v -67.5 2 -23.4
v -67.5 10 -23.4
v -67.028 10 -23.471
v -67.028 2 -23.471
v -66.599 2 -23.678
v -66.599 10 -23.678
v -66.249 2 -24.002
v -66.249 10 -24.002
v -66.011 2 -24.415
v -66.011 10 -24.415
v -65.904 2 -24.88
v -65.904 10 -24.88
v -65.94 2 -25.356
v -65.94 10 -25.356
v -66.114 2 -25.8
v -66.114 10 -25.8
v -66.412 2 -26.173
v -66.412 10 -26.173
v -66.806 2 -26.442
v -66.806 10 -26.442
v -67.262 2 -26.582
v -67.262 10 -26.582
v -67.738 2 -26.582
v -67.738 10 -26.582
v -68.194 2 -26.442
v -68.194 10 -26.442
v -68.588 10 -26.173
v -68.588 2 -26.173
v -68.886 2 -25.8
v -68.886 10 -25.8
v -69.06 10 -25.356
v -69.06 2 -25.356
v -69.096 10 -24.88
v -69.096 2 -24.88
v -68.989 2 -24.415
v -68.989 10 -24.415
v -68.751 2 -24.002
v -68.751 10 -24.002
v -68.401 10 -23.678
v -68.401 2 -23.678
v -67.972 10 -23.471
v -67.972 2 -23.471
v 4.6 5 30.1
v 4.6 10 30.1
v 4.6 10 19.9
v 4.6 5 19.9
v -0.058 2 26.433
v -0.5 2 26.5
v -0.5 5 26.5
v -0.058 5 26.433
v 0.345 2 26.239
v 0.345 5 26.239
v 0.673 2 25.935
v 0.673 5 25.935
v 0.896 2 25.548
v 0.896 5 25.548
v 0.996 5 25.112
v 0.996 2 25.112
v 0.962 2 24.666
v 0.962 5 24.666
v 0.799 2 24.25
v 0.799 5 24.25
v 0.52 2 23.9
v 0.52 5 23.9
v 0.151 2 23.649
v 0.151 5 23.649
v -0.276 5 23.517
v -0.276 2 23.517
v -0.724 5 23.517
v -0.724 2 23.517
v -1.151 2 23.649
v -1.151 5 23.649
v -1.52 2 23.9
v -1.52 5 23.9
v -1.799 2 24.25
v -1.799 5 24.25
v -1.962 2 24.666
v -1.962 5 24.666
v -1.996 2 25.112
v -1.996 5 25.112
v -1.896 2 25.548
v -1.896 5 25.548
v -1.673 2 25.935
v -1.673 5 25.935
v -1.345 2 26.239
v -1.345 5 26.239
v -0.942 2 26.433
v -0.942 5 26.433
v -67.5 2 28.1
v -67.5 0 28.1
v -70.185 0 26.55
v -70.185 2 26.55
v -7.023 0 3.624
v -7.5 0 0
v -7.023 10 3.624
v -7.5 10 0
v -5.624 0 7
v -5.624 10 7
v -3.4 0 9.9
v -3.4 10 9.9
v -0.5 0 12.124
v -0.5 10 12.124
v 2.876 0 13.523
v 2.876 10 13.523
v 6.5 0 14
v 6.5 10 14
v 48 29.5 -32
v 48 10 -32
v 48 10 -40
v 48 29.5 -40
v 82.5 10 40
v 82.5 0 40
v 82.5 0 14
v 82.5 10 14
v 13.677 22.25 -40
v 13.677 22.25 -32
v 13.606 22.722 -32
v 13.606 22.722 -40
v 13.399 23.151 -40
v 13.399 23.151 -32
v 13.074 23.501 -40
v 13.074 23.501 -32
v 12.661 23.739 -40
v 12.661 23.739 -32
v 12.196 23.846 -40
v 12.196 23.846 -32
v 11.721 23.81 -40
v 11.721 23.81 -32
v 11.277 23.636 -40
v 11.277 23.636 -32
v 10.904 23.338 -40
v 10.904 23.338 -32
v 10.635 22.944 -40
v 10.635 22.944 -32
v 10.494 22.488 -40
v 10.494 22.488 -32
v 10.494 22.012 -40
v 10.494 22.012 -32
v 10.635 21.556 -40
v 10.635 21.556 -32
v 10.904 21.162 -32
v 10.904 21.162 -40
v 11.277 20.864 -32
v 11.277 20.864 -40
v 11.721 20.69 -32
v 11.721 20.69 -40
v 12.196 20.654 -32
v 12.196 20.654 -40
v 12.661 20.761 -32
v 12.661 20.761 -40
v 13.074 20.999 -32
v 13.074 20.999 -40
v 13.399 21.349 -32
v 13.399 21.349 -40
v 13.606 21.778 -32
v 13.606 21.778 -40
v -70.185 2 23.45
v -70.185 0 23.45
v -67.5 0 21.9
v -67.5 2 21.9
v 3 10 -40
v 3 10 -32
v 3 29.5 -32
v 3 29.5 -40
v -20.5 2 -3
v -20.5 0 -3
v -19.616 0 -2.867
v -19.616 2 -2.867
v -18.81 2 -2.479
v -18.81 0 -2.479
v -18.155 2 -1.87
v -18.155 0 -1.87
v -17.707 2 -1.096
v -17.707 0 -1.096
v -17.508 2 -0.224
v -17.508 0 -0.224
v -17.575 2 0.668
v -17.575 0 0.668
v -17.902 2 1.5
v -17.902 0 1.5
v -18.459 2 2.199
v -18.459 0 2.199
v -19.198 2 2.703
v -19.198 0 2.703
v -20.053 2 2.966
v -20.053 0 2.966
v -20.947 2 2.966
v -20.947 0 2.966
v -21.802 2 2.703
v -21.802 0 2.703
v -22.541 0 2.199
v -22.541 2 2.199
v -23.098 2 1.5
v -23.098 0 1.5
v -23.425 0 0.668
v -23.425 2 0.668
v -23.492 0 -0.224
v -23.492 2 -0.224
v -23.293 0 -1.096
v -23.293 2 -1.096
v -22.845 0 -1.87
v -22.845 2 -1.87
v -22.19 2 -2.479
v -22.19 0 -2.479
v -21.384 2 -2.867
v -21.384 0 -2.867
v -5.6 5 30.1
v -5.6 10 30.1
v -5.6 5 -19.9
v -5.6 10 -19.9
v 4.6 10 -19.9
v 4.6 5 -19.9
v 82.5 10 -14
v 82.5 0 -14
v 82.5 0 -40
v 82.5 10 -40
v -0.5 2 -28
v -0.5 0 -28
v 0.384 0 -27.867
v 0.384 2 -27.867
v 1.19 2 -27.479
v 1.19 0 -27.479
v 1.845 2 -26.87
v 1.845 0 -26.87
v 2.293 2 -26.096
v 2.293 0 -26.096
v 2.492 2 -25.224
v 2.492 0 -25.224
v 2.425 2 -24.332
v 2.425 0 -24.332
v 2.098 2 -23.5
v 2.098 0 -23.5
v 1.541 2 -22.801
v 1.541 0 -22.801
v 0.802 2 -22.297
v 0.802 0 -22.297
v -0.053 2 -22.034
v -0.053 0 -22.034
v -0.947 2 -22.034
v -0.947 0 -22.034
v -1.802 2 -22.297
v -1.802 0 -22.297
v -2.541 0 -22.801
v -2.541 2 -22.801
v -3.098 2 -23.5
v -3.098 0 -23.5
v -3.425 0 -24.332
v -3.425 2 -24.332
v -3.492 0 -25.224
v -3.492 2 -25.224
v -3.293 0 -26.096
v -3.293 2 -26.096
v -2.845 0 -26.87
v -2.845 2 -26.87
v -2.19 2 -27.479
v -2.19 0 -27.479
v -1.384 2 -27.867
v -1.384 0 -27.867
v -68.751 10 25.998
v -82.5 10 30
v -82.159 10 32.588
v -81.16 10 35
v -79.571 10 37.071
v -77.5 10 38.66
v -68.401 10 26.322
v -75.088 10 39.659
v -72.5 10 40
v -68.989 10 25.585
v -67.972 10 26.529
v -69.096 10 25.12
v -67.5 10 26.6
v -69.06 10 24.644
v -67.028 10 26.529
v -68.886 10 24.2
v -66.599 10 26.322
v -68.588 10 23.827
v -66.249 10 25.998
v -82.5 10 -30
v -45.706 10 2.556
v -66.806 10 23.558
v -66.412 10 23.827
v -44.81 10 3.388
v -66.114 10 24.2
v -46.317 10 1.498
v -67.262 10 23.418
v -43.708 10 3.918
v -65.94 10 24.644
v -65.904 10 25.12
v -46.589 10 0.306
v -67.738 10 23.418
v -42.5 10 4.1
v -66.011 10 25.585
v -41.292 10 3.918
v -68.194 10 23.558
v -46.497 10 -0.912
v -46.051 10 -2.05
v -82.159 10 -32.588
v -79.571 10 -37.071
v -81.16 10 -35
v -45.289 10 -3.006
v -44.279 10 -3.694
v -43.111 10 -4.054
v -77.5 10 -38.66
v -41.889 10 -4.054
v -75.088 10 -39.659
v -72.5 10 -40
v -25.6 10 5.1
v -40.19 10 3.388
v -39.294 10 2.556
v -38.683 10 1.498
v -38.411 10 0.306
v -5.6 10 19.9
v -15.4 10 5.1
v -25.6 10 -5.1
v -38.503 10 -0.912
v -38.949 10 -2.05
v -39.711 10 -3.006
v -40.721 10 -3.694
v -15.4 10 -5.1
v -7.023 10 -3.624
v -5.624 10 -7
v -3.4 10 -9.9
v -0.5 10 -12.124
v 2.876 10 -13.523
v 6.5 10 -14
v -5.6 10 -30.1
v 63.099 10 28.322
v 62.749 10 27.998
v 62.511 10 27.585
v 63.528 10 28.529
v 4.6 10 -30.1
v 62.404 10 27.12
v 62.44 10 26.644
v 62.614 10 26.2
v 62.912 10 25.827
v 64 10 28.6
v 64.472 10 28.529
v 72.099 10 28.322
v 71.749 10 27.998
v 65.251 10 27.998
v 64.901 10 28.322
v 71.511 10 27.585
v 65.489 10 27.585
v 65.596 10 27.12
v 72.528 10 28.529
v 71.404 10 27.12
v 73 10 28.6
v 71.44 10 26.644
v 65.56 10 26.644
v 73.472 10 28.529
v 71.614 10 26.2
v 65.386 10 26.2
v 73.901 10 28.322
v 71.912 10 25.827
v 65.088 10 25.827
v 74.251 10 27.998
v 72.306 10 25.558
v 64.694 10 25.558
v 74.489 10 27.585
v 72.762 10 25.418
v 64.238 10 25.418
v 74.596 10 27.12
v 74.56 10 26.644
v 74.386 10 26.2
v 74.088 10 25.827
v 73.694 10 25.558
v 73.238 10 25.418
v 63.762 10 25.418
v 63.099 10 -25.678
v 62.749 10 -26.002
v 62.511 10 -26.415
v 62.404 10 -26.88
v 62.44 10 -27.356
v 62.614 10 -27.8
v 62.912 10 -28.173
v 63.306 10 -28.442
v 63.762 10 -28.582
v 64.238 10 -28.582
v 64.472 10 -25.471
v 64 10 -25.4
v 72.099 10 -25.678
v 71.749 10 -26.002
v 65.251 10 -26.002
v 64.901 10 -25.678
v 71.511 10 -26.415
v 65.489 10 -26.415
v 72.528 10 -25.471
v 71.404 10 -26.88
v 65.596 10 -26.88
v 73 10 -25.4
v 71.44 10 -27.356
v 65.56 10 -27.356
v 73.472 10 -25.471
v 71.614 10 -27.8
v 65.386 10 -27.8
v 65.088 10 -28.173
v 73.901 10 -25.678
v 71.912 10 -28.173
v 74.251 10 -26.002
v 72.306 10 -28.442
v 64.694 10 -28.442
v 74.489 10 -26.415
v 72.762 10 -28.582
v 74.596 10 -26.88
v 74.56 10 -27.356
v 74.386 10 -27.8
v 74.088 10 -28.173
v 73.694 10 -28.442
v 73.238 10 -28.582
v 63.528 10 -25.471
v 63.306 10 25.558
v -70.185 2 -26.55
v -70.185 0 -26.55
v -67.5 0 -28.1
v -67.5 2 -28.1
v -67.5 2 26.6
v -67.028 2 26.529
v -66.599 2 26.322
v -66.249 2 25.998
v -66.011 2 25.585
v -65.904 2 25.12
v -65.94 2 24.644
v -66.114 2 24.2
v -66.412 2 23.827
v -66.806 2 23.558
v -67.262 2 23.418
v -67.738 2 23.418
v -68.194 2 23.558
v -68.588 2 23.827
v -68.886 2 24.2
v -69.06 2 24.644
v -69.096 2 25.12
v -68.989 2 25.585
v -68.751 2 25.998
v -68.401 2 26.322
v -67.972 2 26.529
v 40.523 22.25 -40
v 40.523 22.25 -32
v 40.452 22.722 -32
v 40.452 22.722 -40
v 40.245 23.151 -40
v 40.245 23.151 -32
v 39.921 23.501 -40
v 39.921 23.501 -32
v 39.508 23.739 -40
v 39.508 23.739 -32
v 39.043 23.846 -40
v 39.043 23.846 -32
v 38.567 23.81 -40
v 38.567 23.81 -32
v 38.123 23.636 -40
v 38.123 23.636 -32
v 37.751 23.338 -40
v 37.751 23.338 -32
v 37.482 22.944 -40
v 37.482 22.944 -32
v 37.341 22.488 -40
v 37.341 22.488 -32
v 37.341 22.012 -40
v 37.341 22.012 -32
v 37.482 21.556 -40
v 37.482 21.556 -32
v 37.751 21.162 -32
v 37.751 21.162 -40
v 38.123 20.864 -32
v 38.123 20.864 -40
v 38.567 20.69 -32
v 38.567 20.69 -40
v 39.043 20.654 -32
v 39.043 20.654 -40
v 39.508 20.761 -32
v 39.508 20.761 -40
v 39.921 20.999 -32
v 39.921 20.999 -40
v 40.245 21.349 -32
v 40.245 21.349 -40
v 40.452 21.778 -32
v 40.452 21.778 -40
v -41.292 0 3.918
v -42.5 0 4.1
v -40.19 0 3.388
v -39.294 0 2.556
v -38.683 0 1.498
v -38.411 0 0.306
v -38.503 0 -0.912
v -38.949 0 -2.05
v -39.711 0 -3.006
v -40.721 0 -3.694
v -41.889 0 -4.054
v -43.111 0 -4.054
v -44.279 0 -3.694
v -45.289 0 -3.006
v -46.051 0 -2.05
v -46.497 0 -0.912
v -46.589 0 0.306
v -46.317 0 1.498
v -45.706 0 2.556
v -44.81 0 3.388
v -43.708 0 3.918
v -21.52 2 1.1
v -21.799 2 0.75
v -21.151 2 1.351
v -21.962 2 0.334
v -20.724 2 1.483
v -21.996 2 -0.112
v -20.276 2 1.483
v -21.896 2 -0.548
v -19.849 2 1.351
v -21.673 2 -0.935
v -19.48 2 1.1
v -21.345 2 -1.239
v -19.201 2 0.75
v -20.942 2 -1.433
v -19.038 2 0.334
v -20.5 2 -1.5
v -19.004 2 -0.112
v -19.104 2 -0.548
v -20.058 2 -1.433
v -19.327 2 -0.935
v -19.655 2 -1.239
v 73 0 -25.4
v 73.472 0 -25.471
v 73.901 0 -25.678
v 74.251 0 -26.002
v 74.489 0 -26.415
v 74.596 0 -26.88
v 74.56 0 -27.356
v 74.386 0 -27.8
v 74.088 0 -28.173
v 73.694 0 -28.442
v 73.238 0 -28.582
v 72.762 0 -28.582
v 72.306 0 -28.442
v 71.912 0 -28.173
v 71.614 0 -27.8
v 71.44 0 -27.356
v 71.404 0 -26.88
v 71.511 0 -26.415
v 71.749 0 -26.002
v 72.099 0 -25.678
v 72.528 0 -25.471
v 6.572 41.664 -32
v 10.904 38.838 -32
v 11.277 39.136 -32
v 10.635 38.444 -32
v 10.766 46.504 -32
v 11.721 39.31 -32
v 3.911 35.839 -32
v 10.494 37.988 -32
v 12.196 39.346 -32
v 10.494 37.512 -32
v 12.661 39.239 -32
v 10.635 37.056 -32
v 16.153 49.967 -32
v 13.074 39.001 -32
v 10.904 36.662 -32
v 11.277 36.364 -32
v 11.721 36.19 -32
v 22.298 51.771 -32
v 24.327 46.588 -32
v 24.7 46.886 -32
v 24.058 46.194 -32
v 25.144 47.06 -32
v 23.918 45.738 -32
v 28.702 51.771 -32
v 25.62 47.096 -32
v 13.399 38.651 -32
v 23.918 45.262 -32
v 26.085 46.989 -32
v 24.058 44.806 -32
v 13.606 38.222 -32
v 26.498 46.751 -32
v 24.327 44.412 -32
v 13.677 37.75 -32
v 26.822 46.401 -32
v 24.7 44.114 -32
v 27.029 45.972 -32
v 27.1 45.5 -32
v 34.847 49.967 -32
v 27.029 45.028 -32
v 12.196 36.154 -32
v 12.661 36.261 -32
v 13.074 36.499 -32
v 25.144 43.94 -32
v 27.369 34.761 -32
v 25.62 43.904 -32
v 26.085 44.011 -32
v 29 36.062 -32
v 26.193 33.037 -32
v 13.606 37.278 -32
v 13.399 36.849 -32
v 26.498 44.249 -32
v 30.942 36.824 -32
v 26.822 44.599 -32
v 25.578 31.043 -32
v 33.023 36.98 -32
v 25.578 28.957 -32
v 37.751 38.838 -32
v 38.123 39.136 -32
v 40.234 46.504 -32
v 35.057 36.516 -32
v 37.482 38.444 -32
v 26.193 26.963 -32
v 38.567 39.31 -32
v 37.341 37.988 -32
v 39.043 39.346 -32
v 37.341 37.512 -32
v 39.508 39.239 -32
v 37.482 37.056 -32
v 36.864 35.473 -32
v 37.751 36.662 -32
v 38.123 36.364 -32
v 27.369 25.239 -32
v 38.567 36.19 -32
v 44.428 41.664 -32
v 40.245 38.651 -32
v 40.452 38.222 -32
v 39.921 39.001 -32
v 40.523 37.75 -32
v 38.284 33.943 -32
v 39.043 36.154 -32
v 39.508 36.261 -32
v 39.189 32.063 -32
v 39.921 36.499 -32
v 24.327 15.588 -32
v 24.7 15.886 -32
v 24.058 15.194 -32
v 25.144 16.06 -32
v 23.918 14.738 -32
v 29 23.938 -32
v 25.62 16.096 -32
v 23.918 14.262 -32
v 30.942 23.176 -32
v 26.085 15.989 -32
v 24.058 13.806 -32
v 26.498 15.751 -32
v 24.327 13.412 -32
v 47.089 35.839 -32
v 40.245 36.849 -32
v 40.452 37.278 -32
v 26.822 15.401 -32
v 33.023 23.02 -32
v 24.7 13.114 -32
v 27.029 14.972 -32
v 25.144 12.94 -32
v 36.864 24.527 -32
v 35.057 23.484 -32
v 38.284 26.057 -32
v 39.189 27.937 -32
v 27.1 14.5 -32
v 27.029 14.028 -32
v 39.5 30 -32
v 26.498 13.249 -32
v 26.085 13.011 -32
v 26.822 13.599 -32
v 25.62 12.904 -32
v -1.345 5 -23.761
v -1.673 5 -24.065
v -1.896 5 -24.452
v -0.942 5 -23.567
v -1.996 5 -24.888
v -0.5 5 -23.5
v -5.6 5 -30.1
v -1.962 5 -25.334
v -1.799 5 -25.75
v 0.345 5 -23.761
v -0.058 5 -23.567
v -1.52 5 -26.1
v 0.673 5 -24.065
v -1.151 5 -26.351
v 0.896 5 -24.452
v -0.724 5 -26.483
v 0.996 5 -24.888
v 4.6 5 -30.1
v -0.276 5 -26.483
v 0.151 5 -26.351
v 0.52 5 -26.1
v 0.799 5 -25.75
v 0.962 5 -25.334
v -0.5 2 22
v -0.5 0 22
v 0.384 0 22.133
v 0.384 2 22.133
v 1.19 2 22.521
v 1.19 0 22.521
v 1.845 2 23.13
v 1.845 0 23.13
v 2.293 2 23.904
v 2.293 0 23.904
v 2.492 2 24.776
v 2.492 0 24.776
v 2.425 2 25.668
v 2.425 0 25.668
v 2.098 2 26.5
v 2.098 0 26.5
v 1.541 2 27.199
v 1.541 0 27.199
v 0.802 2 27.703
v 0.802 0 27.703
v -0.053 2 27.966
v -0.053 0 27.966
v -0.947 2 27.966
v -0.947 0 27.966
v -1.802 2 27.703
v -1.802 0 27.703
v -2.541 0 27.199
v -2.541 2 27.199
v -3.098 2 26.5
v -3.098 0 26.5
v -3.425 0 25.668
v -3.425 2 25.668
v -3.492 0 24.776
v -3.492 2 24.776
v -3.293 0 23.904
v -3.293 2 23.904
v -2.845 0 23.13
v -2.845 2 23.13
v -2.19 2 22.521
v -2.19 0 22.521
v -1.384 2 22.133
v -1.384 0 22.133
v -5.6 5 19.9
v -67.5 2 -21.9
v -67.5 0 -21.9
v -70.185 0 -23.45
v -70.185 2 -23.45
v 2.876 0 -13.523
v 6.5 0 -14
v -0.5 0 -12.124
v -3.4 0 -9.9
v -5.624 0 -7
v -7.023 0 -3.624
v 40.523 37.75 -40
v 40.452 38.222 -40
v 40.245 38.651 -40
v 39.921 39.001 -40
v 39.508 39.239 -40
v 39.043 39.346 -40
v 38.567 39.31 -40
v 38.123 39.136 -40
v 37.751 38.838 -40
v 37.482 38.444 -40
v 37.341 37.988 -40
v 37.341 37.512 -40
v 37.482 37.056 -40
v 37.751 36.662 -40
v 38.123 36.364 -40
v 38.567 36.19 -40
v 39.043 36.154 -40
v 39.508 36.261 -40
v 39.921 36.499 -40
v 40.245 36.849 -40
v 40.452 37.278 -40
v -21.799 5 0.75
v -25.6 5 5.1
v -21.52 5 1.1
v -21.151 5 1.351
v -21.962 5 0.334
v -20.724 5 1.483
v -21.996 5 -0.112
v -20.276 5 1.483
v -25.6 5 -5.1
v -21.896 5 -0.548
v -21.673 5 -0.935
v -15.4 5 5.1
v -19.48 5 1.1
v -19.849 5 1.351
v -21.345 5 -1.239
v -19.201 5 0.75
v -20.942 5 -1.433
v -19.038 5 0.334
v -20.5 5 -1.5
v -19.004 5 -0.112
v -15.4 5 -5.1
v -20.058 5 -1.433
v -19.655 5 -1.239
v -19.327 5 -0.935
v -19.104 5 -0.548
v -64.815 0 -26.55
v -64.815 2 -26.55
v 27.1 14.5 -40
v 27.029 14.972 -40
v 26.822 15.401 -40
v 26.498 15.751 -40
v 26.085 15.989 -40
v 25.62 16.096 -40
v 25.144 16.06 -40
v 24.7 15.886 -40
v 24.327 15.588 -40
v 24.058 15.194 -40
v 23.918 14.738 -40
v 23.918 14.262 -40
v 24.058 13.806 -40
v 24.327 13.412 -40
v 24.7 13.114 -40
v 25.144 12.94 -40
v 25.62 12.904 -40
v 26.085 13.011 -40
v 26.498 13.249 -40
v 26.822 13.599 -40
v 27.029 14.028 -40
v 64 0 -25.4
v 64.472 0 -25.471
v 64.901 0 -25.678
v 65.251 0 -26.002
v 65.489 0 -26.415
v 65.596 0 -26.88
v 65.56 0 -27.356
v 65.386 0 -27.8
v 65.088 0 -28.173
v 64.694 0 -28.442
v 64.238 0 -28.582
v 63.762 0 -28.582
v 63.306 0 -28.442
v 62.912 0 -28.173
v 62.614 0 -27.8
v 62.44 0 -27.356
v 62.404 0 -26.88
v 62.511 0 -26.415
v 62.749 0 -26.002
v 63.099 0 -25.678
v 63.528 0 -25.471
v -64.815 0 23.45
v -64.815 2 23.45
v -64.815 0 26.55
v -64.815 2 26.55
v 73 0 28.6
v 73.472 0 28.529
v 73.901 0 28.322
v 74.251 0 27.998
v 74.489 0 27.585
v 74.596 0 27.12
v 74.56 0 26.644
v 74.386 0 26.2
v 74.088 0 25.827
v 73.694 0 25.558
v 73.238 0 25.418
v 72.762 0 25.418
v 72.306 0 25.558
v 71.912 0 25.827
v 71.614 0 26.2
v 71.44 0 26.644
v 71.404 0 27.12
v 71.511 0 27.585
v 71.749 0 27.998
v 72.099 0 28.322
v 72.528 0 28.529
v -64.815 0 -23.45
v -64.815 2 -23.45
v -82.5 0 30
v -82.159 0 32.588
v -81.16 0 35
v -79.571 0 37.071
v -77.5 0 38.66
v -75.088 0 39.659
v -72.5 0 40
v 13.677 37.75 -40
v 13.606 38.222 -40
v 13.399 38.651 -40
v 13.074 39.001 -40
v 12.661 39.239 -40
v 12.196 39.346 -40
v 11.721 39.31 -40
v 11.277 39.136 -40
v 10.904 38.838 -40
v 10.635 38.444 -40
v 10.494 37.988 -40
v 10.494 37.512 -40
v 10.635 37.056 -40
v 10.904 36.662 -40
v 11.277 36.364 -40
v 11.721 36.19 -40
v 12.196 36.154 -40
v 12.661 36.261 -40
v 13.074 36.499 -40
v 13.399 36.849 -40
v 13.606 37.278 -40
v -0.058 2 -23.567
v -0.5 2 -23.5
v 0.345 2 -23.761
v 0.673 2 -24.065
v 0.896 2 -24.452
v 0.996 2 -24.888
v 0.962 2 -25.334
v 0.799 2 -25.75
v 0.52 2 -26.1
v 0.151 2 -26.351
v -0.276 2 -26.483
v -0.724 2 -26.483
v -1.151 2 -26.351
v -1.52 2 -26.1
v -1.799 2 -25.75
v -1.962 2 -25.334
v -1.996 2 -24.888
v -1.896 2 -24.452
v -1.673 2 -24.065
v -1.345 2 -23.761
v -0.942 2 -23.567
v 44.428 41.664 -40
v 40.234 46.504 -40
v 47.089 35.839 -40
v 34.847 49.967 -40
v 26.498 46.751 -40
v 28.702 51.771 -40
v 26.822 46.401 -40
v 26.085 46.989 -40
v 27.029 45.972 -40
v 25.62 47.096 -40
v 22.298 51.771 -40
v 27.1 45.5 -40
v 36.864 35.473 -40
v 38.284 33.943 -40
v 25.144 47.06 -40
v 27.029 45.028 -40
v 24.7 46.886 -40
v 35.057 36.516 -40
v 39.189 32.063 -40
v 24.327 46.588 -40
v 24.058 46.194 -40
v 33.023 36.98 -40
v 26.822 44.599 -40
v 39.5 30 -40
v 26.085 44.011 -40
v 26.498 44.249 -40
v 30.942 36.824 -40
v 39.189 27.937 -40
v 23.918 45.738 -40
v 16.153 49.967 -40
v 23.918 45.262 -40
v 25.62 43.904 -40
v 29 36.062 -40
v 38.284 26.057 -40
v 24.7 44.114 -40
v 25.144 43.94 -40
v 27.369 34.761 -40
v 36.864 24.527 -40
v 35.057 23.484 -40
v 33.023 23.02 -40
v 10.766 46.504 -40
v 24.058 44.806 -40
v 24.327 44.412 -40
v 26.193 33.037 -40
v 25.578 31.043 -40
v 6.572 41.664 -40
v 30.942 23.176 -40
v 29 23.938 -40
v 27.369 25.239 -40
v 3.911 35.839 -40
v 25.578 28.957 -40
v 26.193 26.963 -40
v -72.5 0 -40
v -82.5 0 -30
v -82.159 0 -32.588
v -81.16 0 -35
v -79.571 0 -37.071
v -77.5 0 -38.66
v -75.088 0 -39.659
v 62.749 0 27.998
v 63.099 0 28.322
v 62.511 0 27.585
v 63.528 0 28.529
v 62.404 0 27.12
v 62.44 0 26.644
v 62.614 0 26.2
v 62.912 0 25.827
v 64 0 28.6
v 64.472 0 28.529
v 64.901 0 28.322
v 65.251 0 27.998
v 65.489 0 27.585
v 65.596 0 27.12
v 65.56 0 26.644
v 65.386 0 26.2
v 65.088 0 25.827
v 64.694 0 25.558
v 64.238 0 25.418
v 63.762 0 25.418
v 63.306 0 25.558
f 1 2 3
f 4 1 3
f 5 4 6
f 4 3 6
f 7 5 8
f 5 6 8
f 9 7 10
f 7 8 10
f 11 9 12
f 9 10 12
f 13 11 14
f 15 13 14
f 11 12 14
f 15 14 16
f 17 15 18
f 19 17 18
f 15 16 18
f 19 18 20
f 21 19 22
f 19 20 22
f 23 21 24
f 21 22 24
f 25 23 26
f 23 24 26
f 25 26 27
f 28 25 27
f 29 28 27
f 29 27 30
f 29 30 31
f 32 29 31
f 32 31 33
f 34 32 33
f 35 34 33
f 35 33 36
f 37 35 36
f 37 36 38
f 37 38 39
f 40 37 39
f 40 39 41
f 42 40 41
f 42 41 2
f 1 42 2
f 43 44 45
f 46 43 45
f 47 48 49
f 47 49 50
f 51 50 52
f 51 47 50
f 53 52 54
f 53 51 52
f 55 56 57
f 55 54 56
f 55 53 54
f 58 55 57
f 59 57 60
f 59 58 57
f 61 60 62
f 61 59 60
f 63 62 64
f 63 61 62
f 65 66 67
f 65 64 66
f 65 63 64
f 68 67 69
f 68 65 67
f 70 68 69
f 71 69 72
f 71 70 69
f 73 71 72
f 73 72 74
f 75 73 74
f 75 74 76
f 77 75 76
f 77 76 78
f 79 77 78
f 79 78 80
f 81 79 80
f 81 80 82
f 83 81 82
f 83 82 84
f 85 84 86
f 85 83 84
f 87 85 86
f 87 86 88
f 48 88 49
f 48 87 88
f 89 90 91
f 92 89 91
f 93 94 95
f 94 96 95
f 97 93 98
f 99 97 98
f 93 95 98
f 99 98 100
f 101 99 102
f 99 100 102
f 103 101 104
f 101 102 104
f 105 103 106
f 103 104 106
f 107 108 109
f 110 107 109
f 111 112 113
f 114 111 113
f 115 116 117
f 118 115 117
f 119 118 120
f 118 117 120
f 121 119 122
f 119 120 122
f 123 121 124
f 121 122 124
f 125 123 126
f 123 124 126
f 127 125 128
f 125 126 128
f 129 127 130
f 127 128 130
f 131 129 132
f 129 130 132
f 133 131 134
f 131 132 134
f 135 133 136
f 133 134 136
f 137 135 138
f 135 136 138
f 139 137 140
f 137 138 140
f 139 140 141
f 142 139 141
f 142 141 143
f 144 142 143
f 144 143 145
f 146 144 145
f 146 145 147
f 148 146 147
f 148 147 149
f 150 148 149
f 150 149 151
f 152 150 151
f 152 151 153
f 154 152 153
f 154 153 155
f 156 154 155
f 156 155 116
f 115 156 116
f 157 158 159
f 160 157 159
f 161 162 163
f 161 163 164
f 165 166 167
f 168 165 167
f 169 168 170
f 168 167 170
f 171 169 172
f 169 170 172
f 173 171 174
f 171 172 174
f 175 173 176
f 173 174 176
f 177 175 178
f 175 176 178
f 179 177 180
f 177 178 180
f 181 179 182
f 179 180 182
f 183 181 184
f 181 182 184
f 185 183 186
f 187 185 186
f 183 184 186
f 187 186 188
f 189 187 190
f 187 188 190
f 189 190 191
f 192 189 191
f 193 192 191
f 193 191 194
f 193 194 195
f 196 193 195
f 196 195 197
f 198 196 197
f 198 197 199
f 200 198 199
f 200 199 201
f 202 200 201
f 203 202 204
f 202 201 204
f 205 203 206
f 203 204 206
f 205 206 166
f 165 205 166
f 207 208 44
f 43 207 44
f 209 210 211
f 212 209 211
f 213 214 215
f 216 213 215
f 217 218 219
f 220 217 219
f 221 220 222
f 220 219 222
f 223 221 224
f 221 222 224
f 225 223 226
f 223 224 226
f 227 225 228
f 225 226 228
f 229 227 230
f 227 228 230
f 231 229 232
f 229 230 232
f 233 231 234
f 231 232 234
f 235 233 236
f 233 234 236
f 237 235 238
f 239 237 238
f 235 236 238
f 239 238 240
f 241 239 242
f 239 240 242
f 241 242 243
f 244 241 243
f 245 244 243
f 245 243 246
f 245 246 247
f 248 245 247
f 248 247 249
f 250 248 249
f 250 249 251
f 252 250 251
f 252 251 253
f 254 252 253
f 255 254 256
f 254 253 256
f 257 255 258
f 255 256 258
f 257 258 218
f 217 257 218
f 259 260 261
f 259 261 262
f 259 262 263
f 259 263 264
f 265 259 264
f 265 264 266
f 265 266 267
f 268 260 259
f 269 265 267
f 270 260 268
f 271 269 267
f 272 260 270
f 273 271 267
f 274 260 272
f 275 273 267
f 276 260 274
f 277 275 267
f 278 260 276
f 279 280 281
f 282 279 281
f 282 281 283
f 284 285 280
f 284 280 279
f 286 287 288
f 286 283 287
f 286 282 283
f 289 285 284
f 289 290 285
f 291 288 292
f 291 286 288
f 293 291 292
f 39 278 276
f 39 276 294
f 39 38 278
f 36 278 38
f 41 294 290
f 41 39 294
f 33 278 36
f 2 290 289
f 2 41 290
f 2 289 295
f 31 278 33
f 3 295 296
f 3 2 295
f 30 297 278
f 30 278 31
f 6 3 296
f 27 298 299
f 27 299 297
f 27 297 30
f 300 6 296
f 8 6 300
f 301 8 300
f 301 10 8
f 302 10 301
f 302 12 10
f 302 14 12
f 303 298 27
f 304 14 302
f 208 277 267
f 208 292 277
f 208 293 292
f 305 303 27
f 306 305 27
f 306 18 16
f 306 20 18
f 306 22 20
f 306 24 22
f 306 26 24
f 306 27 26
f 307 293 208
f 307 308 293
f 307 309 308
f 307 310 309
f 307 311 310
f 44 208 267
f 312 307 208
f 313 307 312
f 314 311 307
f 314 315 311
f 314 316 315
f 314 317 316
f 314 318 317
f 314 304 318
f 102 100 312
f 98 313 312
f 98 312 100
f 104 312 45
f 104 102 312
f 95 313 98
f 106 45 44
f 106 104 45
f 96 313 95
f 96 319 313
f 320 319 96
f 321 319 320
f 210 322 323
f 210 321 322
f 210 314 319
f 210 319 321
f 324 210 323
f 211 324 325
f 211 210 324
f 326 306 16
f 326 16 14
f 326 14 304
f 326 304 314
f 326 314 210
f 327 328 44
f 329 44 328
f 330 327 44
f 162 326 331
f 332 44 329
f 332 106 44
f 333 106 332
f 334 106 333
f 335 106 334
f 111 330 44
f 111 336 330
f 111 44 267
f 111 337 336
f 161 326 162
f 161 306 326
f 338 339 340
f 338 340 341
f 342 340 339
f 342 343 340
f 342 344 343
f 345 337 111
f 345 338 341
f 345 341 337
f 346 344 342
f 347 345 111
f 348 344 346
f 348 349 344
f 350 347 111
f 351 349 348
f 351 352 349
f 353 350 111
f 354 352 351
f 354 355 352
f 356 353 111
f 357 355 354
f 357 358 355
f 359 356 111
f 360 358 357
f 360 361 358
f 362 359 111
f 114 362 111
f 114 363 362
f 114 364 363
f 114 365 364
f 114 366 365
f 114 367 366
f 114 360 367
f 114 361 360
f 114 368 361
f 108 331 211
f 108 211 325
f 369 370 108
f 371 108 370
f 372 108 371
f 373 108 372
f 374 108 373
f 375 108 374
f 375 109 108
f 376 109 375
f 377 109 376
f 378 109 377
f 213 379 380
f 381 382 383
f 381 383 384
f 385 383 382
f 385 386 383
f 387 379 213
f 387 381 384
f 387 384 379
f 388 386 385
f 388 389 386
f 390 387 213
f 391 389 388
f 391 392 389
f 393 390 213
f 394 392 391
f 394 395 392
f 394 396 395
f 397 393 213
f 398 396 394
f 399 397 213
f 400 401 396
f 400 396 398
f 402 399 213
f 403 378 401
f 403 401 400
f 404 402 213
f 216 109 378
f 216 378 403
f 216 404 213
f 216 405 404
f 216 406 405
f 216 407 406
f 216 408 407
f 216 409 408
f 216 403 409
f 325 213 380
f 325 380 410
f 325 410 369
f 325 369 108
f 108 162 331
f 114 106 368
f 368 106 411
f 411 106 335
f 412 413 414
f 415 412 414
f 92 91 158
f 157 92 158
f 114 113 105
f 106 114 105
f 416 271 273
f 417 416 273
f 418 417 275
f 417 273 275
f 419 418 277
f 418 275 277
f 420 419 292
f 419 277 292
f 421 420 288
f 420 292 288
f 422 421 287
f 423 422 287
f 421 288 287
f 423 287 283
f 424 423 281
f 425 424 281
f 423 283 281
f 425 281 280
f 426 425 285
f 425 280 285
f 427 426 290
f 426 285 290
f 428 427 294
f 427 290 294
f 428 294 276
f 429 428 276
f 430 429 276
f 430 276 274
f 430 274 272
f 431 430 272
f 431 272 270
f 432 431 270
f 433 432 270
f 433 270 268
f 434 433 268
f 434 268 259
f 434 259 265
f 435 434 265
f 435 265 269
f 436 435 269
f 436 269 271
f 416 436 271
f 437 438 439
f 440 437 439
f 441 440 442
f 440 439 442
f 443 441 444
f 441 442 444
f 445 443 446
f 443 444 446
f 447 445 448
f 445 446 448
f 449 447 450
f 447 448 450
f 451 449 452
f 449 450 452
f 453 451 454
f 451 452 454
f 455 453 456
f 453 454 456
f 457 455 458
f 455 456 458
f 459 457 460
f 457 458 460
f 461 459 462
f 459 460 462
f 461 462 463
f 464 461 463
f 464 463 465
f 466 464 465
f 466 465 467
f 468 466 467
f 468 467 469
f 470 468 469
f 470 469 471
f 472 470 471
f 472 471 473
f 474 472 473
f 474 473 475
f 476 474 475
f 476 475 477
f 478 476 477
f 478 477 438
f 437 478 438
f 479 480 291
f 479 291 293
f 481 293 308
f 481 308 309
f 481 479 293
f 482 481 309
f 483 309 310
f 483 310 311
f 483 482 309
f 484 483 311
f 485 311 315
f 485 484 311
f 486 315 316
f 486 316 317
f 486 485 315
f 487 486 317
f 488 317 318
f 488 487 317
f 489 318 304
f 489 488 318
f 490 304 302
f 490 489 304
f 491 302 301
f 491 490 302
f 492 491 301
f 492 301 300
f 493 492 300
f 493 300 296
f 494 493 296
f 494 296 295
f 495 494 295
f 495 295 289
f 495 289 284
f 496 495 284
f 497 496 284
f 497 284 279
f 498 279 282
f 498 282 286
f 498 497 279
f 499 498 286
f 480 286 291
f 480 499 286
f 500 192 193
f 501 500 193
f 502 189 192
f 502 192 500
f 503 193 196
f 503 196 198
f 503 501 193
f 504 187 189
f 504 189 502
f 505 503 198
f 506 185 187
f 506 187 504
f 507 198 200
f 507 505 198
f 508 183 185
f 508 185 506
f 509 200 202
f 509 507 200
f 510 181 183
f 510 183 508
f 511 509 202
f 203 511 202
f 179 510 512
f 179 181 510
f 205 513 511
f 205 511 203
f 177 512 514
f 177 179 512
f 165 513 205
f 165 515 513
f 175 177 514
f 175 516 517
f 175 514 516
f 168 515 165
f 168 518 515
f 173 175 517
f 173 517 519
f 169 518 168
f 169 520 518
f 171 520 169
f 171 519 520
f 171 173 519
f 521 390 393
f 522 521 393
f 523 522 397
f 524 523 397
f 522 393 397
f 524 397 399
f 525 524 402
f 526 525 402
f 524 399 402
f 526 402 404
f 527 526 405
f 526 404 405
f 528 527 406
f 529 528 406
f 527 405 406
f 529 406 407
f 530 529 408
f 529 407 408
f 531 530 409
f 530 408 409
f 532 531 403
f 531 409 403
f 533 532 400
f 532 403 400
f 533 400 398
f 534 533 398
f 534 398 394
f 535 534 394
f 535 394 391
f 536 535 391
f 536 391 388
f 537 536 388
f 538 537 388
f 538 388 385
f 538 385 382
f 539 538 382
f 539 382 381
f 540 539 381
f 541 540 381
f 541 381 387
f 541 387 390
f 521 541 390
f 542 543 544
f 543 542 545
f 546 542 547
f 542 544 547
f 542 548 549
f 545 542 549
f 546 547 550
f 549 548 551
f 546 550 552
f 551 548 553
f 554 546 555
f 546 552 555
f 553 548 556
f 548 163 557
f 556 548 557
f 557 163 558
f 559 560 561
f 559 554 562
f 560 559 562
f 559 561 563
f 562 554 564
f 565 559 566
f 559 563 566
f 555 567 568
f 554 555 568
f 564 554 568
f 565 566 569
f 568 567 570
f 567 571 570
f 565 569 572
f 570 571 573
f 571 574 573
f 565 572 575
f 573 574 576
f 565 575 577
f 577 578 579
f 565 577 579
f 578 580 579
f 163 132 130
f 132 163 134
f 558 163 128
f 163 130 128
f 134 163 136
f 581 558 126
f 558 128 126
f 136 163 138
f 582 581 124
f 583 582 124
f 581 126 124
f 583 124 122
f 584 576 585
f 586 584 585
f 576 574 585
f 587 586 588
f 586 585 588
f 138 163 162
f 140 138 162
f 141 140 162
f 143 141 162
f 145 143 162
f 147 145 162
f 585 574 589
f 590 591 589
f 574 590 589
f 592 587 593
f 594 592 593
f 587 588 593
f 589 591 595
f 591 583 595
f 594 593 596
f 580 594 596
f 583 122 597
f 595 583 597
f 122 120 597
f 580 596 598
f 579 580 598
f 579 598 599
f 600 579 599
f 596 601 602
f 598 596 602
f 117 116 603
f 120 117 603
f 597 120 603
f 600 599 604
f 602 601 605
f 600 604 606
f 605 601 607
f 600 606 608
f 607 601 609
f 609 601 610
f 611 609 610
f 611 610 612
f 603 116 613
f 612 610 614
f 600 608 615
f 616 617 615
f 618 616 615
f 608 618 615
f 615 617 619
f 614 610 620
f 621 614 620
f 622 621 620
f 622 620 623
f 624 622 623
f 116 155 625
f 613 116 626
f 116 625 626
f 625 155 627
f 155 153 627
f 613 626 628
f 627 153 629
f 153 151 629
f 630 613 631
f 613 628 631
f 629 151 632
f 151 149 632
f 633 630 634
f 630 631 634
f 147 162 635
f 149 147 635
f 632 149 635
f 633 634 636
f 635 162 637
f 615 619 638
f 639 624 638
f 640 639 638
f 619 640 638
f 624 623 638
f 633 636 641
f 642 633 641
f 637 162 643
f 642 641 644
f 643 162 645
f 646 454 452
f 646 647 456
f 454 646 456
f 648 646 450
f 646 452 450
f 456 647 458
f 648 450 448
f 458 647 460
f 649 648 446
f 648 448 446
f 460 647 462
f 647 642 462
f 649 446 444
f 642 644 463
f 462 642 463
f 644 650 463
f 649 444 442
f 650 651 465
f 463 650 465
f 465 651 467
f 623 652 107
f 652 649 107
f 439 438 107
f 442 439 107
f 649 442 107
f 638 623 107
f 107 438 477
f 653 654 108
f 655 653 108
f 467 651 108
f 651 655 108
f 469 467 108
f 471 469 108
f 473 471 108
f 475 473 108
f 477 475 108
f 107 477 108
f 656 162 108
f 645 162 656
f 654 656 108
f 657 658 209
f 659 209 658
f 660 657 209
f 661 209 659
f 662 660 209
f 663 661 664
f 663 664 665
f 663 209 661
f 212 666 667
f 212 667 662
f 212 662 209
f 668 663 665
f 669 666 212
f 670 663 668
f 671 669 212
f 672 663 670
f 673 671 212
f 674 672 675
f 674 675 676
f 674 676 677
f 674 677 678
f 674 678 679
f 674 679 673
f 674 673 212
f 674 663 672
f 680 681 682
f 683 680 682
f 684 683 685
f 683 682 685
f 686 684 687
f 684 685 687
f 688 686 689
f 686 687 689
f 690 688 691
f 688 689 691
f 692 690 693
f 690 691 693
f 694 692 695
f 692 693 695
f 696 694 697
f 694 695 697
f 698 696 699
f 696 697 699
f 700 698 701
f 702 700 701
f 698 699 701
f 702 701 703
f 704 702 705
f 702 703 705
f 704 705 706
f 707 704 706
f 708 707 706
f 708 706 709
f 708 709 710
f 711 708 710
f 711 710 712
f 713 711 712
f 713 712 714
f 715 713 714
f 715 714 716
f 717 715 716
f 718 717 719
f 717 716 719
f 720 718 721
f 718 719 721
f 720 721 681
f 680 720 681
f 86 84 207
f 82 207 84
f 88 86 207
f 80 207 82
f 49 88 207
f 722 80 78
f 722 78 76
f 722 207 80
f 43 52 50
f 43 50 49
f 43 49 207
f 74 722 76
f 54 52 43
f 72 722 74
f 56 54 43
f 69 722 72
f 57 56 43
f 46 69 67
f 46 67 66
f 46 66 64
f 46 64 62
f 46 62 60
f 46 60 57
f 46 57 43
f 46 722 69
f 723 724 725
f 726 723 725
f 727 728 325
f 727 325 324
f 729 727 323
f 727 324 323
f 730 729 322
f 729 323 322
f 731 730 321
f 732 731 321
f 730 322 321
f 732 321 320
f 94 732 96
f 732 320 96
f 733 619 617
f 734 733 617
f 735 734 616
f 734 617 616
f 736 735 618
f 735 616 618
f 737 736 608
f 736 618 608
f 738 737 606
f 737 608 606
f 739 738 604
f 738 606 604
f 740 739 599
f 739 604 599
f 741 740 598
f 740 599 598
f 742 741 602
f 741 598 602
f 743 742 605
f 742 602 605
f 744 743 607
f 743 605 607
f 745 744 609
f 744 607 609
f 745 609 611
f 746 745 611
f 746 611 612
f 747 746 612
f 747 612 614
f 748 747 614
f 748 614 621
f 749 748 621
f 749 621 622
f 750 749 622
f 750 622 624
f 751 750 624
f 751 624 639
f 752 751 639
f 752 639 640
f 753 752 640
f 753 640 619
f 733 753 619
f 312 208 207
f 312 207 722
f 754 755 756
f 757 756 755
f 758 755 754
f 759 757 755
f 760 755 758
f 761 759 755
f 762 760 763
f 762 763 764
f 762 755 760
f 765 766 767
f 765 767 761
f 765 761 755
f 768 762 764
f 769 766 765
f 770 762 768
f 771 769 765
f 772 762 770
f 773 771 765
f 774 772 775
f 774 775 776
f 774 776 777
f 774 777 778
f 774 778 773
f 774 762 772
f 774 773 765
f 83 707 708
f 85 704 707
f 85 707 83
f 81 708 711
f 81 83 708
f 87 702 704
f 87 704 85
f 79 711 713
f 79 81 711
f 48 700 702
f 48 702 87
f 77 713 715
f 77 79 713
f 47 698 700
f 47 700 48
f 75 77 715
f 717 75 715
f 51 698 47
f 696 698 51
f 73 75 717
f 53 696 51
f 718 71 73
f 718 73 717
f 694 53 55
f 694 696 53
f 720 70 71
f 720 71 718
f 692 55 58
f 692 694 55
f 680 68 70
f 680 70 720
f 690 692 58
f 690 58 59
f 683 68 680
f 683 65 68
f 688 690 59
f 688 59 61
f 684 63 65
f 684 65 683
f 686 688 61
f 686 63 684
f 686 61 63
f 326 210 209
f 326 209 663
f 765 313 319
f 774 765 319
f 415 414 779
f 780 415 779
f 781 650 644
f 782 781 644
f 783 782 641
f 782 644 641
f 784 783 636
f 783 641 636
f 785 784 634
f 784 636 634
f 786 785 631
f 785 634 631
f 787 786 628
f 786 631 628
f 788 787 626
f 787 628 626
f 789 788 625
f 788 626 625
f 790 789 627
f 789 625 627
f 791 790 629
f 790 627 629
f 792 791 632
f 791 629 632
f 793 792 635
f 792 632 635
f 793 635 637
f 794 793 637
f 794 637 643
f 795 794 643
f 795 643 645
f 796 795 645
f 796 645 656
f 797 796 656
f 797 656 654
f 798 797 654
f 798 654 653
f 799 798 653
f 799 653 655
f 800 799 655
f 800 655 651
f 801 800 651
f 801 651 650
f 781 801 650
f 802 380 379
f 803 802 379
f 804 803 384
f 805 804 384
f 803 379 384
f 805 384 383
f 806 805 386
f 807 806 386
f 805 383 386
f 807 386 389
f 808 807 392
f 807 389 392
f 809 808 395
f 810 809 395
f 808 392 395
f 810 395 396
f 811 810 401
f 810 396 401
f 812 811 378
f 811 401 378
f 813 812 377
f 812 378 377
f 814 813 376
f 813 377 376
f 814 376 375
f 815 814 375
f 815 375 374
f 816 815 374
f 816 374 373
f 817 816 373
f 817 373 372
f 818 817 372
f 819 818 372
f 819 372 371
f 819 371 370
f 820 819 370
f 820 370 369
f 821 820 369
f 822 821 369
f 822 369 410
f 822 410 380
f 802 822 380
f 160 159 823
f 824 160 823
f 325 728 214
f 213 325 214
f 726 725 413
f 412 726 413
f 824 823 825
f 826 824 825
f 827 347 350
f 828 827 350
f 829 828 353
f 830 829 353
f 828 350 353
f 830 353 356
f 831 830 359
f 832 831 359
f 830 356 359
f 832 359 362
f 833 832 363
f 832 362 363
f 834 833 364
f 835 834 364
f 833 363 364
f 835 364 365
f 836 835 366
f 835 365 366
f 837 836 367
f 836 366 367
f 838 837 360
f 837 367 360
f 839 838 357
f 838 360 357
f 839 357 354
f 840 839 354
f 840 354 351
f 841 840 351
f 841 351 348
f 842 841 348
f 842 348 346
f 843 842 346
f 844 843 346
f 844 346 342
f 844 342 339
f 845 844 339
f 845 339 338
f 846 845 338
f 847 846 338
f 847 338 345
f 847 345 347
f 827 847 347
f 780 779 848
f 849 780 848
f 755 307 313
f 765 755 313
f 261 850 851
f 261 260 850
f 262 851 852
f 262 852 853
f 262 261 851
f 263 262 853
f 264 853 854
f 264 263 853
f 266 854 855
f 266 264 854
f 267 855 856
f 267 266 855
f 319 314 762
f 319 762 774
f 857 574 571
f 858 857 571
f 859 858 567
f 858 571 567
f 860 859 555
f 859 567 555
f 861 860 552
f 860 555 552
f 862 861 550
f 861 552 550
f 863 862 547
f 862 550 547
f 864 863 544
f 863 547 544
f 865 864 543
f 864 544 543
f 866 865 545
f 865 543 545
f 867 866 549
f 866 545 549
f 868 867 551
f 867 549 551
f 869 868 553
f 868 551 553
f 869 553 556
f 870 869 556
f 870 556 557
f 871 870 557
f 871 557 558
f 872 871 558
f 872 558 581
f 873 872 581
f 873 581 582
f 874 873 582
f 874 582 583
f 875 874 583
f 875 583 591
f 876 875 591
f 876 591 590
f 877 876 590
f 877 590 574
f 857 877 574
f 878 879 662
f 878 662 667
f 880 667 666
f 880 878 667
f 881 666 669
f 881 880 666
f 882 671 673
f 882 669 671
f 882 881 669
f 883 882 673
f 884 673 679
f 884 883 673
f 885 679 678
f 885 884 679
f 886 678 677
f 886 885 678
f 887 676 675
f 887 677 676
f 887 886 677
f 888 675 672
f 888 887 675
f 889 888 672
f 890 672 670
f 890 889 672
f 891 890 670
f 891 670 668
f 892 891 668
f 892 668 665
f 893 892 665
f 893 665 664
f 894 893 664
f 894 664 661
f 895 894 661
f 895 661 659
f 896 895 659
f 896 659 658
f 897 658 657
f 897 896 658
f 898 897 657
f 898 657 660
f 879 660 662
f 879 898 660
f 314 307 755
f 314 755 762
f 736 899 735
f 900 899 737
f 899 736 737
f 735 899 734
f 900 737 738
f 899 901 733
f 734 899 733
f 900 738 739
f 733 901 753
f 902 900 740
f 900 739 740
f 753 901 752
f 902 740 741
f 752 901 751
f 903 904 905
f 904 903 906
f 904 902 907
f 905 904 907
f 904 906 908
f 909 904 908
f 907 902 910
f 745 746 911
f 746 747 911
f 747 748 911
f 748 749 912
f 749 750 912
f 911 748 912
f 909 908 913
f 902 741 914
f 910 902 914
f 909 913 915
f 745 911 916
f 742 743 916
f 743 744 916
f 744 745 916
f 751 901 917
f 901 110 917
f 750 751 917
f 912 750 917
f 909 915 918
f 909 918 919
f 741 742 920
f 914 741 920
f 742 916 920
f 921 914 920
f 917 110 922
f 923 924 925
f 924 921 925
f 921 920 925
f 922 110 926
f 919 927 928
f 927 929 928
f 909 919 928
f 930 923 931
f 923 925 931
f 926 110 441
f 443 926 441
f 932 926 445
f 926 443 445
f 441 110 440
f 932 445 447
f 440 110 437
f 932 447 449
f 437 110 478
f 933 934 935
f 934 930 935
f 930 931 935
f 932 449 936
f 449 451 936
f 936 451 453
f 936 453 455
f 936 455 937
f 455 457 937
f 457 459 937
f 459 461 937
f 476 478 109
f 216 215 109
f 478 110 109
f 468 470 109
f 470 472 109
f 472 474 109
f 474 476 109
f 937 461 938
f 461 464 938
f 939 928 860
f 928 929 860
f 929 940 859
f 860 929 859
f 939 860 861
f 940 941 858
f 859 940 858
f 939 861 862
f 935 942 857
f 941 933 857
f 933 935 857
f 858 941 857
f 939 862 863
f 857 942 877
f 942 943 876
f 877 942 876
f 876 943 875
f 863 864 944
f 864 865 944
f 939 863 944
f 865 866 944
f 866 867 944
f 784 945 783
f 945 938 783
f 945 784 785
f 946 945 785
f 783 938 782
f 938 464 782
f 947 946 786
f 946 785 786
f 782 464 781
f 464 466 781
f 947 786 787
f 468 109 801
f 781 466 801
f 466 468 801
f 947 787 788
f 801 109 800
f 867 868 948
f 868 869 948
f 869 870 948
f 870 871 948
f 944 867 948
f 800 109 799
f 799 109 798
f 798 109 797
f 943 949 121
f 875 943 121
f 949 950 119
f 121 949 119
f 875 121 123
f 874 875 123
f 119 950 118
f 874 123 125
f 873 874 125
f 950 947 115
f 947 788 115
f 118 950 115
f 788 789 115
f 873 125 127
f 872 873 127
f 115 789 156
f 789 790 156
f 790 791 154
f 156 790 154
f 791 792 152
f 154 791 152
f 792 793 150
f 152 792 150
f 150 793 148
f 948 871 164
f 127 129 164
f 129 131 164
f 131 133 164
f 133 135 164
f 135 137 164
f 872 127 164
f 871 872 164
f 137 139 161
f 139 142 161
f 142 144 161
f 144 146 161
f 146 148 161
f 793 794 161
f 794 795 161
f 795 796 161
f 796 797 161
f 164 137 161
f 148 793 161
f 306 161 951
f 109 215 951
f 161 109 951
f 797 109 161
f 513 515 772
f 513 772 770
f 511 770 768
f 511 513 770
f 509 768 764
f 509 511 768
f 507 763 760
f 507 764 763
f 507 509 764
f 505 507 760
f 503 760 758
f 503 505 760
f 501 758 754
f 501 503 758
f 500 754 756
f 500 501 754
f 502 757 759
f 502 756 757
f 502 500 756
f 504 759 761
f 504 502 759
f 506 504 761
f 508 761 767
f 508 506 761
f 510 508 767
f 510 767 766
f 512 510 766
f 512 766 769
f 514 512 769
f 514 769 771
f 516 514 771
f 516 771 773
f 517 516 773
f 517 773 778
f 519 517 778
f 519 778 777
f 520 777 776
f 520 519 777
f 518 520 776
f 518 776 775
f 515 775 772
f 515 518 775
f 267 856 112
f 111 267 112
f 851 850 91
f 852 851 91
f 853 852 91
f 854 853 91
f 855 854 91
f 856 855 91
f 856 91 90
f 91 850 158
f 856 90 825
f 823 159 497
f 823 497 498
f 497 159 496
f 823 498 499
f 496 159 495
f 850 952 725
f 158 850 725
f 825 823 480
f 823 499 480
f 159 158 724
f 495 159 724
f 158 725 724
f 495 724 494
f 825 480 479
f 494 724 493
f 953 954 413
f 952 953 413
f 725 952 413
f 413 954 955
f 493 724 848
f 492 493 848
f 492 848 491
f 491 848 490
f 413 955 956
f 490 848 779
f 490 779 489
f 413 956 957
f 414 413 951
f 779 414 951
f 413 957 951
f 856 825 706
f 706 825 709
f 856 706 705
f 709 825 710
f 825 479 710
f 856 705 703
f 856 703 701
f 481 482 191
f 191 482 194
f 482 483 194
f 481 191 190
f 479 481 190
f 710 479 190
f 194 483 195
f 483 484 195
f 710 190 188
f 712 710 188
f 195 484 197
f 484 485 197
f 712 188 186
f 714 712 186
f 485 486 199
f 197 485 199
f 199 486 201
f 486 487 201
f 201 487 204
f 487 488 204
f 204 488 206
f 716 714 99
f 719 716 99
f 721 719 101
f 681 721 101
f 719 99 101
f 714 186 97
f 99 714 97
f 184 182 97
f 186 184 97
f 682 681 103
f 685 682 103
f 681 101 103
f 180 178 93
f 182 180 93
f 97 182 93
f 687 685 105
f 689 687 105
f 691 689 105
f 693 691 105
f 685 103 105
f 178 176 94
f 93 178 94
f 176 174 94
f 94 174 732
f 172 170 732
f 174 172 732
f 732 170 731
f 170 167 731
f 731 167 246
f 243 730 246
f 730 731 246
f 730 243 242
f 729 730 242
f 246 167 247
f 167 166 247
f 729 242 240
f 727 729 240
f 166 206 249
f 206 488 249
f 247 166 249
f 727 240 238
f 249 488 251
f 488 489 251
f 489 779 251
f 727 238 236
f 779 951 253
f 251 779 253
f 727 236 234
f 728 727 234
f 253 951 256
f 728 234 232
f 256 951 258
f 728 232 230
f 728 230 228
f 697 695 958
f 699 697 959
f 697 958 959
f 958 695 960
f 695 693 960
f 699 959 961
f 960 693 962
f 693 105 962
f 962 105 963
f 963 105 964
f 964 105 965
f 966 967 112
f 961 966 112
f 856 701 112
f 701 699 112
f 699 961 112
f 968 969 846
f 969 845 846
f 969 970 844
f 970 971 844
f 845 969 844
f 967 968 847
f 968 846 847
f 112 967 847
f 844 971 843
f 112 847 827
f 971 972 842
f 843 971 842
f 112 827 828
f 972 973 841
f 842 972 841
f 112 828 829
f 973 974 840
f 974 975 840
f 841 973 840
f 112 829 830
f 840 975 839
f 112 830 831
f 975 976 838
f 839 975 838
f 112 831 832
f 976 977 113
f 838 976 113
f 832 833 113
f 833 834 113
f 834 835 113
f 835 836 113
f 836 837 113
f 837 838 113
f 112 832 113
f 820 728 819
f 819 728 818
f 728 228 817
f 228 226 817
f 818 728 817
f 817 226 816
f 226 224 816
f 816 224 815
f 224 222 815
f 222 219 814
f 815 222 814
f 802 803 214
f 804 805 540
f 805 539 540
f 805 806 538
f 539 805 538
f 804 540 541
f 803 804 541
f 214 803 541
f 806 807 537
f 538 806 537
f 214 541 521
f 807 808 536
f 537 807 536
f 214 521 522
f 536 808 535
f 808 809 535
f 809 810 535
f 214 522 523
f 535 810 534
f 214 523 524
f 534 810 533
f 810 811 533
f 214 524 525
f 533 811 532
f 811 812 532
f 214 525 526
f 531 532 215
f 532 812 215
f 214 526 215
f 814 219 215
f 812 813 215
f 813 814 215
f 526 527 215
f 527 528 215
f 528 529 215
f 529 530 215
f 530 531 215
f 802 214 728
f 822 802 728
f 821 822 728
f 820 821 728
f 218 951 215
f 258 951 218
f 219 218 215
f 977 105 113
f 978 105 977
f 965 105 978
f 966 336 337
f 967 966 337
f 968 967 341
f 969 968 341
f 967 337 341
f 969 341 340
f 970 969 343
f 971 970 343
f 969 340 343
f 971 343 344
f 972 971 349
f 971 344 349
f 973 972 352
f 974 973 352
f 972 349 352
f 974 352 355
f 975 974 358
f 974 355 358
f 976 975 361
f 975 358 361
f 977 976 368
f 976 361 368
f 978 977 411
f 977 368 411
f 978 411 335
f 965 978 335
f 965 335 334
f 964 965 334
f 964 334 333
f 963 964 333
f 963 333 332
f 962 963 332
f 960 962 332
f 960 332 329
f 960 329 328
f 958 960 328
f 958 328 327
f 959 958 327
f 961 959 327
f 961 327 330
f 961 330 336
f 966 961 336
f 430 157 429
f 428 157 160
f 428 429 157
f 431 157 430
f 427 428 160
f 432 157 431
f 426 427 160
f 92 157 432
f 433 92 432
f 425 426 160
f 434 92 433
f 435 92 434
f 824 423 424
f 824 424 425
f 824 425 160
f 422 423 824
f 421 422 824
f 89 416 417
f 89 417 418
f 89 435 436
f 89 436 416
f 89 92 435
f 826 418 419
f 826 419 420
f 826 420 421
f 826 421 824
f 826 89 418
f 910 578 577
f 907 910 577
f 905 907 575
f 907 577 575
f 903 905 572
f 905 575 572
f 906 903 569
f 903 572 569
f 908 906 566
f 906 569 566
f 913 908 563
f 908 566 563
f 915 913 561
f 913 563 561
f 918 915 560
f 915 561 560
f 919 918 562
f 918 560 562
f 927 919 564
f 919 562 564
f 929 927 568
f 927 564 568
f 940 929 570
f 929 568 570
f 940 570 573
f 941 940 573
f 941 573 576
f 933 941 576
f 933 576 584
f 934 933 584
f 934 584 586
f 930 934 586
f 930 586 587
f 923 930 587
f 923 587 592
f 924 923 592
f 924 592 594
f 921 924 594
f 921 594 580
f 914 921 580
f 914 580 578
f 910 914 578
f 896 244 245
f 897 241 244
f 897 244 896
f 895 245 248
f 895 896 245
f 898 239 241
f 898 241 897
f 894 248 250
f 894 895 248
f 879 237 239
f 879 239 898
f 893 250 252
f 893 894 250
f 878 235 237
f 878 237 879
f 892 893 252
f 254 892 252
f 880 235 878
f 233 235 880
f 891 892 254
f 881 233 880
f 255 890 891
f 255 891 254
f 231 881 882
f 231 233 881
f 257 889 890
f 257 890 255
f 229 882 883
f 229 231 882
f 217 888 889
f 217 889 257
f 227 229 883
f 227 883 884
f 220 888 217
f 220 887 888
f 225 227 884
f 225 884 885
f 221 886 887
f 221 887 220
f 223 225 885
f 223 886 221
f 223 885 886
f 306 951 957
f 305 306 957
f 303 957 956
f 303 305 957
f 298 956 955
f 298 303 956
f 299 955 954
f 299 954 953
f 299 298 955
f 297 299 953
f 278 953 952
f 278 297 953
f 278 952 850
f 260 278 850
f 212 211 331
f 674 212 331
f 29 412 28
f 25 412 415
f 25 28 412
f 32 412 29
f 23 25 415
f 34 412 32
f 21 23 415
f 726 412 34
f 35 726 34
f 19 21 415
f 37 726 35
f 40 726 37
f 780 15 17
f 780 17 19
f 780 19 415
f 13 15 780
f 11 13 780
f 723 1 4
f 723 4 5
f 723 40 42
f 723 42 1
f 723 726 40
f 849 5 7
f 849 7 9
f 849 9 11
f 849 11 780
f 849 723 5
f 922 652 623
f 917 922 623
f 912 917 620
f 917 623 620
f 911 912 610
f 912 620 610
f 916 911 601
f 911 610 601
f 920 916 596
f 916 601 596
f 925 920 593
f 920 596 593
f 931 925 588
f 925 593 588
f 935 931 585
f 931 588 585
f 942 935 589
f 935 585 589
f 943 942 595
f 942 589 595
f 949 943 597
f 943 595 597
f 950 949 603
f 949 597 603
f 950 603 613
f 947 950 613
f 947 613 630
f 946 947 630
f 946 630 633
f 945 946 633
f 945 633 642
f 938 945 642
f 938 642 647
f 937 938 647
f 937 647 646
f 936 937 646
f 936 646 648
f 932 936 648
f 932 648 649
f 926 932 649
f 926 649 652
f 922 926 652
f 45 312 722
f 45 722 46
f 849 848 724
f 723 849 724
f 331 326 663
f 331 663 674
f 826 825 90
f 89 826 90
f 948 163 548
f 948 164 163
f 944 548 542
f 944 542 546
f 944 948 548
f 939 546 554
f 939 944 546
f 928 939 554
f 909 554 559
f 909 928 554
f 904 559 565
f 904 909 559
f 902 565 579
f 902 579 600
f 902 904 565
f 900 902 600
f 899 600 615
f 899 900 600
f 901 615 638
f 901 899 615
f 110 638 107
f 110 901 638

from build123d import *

# Parameters (mm, degrees)
SKETCH_1_R          = 4.1
EXTRUDE_1_DEPTH     = 10
FILLET_1_R          = 10
FILLET_2_R          = 14
SKETCH_5_W          = 45
SKETCH_5_H          = 8
EXTRUDE_4_DEPTH     = 42
FILLET_3_RADIUS     = 22.5
FILLET_3_LENGTH     = 8
SKETCH_6_R          = 7
SKETCH_6_R_2        = 1.6
CUT_EXTRUDE_1_DEPTH = 122.21984161
SKETCH_7_W          = 10.2
SKETCH_7_H          = 10.2
CUT_EXTRUDE_2_DEPTH = 5
SKETCH_8_R          = 1.6
CUT_EXTRUDE_3_DEPTH = 101.847657385
SKETCH_2_R          = 1.6
CUT_EXTRUDE_5_DEPTH = 101.847657385
CUT_EXTRUDE_6_REACH = 107.405
SKETCH_9_R          = 1.5
SKETCH_10_R         = 3
CUT_EXTRUDE_7_DEPTH = 2


with BuildPart() as part:
    # ｽｹｯﾁ1 → ﾎﾞｽ - 押し出し1 (new body)
    with BuildSketch(Plane(origin=(0, 0, 0), x_dir=(1, 0, 0), z_dir=(0, 1, 0))):
        Polygon((82.5, 14), (82.5, 40), (-82.5, 40), (-82.5, -40), (82.5, -40), (82.5, -14), (-7.5, -14), (-7.5, 14), align=None)
        with Locations(Location((-42.5, 0, 0), (0, 0, 270))):
            Circle(SKETCH_1_R, mode=Mode.SUBTRACT)
    extrude(amount=EXTRUDE_1_DEPTH)

    # ﾌｨﾚｯﾄ1
    fillet_1_edges = [part.edges().sort_by_distance(p)[0] for p in [
        (-82.5, 5, 40),
        (-82.5, 5, -40),
    ]]
    fillet(fillet_1_edges, radius=FILLET_1_R)

    # ﾌｨﾚｯﾄ2
    fillet_2_edges = [part.edges().sort_by_distance(p)[0] for p in [
        (-7.5, 5, -14),
        (-7.5, 5, 14),
    ]]
    fillet(fillet_2_edges, radius=FILLET_2_R - 0.0001)  # a hair under: the kernel refuses the full size

    # ｽｹｯﾁ5 → ﾎﾞｽ - 押し出し4 (add)
    with BuildSketch(Plane(origin=(0, 10, 0), x_dir=(1, 0, 0), z_dir=(0, 1, 0))):
        with Locations((25.5, 36)):
            Rectangle(SKETCH_5_W, SKETCH_5_H)
    extrude(amount=EXTRUDE_4_DEPTH)

    # ﾌｨﾚｯﾄ3: full round fillet: the end face becomes a half cylinder, R = half its width
    fillet_3_face = Plane((25.5, 52, -36), x_dir=(0, 0, -1), z_dir=(0, 1, 0))  # on the end face: x along it, z out of the body
    fillet_3_slab = fillet_3_face.offset(-FILLET_3_RADIUS / 2) * Box(FILLET_3_LENGTH, 2 * FILLET_3_RADIUS, FILLET_3_RADIUS, mode=Mode.PRIVATE)  # the body's end, R deep
    fillet_3_round = Plane((25.5, 29.5, -36), x_dir=(0, 1, 0), z_dir=(0, 0, -1)) * Cylinder(FILLET_3_RADIUS, FILLET_3_LENGTH, mode=Mode.PRIVATE)  # its axis R under the face
    add(fillet_3_slab - fillet_3_round, mode=Mode.SUBTRACT)

    # ｽｹｯﾁ6 → ｶｯﾄ - 押し出し1 (cut, through all)
    with BuildSketch(Plane.XY.offset(-32)):
        with Locations((32.5, 30)):
            Circle(SKETCH_6_R)
        with Locations((25.5, 45.5)):
            Circle(SKETCH_6_R_2)
        with Locations((38.923393759, 37.75)):
            Circle(SKETCH_6_R_2)
        with Locations((38.923393759, 22.25)):
            Circle(SKETCH_6_R_2)
        with Locations((25.5, 14.5)):
            Circle(SKETCH_6_R_2)
        with Locations((12.076606241, 22.25)):
            Circle(SKETCH_6_R_2)
        with Locations((12.076606241, 37.75)):
            Circle(SKETCH_6_R_2)
    extrude(amount=-CUT_EXTRUDE_1_DEPTH, mode=Mode.SUBTRACT)

    # ｽｹｯﾁ7 → ｶｯﾄ - 押し出し2 (cut)
    with BuildSketch(Plane(origin=(0, 10, 0), x_dir=(1, 0, 0), z_dir=(0, 1, 0))):
        with Locations((-0.5, 25)):
            Rectangle(SKETCH_7_W, SKETCH_7_H)
        with Locations((-0.5, -25)):
            Rectangle(SKETCH_7_W, SKETCH_7_H)
        with Locations((-20.5, 0)):
            Rectangle(SKETCH_7_W, SKETCH_7_H)
    extrude(amount=-CUT_EXTRUDE_2_DEPTH, mode=Mode.SUBTRACT)

    # ｽｹｯﾁ8 → ｶｯﾄ - 押し出し3 (cut, through all)
    with BuildSketch(Plane(origin=(0, 10, 0), x_dir=(1, 0, 0), z_dir=(0, 1, 0))):
        with Locations(Location((73, 27, 0), (0, 0, 270))):
            Circle(SKETCH_8_R)
        with Locations(Location((64, 27, 0), (0, 0, 270))):
            Circle(SKETCH_8_R)
        with Locations(Location((64, -27, 0), (0, 0, 270))):
            Circle(SKETCH_8_R)
        with Locations(Location((73, -27, 0), (0, 0, 270))):
            Circle(SKETCH_8_R)
    extrude(amount=-CUT_EXTRUDE_3_DEPTH, mode=Mode.SUBTRACT)

    # ｽｹｯﾁ2 → ｶｯﾄ - 押し出し5 (cut, through all)
    with BuildSketch(Plane(origin=(0, 10, 0), x_dir=(1, 0, 0), z_dir=(0, 1, 0))):
        with Locations(Location((-67.5, 25, 0), (0, 0, 270))):
            Circle(SKETCH_2_R)
        with Locations(Location((-67.5, -25, 0), (0, 0, 270))):
            Circle(SKETCH_2_R)
    extrude(amount=-CUT_EXTRUDE_5_DEPTH, mode=Mode.SUBTRACT)

    # ｽｹｯﾁ9 → ｶｯﾄ - 押し出し6 (cut, up to next)
    with BuildSketch(Plane(origin=(0, 0, 0), x_dir=(1, 0, 0), z_dir=(0, 1, 0)), mode=Mode.PRIVATE) as cut_extrude_6_sk1:
        with Locations(Location((-0.5, 25, 0), (0, 0, 270))):
            Circle(SKETCH_9_R)
    cut_extrude_6_tool1 = extrude(cut_extrude_6_sk1.sketch, amount=CUT_EXTRUDE_6_REACH, mode=Mode.PRIVATE) & part.part
    # ｽｹｯﾁ9 → ｶｯﾄ - 押し出し6 (cut, up to next)
    with BuildSketch(Plane(origin=(0, 0, 0), x_dir=(1, 0, 0), z_dir=(0, 1, 0)), mode=Mode.PRIVATE) as cut_extrude_6_sk2:
        with Locations(Location((-20.5, 0, 0), (0, 0, 90))):
            Circle(SKETCH_9_R)
    cut_extrude_6_tool2 = extrude(cut_extrude_6_sk2.sketch, amount=CUT_EXTRUDE_6_REACH, mode=Mode.PRIVATE) & part.part
    # ｽｹｯﾁ9 → ｶｯﾄ - 押し出し6 (cut, up to next)
    with BuildSketch(Plane(origin=(0, 0, 0), x_dir=(1, 0, 0), z_dir=(0, 1, 0)), mode=Mode.PRIVATE) as cut_extrude_6_sk3:
        with Locations(Location((-0.5, -25, 0), (0, 0, 270))):
            Circle(SKETCH_9_R)
    cut_extrude_6_tool3 = extrude(cut_extrude_6_sk3.sketch, amount=CUT_EXTRUDE_6_REACH, mode=Mode.PRIVATE) & part.part
    add(cut_extrude_6_tool1.solids().sort_by_distance((-0.5, 0, -25))[0], mode=Mode.SUBTRACT)
    add(cut_extrude_6_tool2.solids().sort_by_distance((-20.5, 0, 0))[0], mode=Mode.SUBTRACT)
    add(cut_extrude_6_tool3.solids().sort_by_distance((-0.5, 0, 25))[0], mode=Mode.SUBTRACT)

    # ｽｹｯﾁ10 → ｶｯﾄ - 押し出し7 (cut)
    with BuildSketch(Plane.XZ):
        with Locations(Location((-0.5, 25, 0), (0, 0, 270))):
            Circle(SKETCH_10_R)
        with Locations(Location((-20.5, 0, 0), (0, 0, 270))):
            Circle(SKETCH_10_R)
        with Locations(Location((-0.5, -25, 0), (0, 0, 270))):
            Circle(SKETCH_10_R)
        Polygon((-67.5, 28.1), (-70.184678752, 26.55), (-70.184678752, 23.45), (-67.5, 21.9), (-64.815321248, 23.45), (-64.815321248, 26.55), align=None)
        Polygon((-67.5, -21.9), (-70.184678752, -23.45), (-70.184678752, -26.55), (-67.5, -28.1), (-64.815321248, -26.55), (-64.815321248, -23.45), align=None)
    extrude(amount=-CUT_EXTRUDE_7_DEPTH, mode=Mode.SUBTRACT)


solid = part.part
